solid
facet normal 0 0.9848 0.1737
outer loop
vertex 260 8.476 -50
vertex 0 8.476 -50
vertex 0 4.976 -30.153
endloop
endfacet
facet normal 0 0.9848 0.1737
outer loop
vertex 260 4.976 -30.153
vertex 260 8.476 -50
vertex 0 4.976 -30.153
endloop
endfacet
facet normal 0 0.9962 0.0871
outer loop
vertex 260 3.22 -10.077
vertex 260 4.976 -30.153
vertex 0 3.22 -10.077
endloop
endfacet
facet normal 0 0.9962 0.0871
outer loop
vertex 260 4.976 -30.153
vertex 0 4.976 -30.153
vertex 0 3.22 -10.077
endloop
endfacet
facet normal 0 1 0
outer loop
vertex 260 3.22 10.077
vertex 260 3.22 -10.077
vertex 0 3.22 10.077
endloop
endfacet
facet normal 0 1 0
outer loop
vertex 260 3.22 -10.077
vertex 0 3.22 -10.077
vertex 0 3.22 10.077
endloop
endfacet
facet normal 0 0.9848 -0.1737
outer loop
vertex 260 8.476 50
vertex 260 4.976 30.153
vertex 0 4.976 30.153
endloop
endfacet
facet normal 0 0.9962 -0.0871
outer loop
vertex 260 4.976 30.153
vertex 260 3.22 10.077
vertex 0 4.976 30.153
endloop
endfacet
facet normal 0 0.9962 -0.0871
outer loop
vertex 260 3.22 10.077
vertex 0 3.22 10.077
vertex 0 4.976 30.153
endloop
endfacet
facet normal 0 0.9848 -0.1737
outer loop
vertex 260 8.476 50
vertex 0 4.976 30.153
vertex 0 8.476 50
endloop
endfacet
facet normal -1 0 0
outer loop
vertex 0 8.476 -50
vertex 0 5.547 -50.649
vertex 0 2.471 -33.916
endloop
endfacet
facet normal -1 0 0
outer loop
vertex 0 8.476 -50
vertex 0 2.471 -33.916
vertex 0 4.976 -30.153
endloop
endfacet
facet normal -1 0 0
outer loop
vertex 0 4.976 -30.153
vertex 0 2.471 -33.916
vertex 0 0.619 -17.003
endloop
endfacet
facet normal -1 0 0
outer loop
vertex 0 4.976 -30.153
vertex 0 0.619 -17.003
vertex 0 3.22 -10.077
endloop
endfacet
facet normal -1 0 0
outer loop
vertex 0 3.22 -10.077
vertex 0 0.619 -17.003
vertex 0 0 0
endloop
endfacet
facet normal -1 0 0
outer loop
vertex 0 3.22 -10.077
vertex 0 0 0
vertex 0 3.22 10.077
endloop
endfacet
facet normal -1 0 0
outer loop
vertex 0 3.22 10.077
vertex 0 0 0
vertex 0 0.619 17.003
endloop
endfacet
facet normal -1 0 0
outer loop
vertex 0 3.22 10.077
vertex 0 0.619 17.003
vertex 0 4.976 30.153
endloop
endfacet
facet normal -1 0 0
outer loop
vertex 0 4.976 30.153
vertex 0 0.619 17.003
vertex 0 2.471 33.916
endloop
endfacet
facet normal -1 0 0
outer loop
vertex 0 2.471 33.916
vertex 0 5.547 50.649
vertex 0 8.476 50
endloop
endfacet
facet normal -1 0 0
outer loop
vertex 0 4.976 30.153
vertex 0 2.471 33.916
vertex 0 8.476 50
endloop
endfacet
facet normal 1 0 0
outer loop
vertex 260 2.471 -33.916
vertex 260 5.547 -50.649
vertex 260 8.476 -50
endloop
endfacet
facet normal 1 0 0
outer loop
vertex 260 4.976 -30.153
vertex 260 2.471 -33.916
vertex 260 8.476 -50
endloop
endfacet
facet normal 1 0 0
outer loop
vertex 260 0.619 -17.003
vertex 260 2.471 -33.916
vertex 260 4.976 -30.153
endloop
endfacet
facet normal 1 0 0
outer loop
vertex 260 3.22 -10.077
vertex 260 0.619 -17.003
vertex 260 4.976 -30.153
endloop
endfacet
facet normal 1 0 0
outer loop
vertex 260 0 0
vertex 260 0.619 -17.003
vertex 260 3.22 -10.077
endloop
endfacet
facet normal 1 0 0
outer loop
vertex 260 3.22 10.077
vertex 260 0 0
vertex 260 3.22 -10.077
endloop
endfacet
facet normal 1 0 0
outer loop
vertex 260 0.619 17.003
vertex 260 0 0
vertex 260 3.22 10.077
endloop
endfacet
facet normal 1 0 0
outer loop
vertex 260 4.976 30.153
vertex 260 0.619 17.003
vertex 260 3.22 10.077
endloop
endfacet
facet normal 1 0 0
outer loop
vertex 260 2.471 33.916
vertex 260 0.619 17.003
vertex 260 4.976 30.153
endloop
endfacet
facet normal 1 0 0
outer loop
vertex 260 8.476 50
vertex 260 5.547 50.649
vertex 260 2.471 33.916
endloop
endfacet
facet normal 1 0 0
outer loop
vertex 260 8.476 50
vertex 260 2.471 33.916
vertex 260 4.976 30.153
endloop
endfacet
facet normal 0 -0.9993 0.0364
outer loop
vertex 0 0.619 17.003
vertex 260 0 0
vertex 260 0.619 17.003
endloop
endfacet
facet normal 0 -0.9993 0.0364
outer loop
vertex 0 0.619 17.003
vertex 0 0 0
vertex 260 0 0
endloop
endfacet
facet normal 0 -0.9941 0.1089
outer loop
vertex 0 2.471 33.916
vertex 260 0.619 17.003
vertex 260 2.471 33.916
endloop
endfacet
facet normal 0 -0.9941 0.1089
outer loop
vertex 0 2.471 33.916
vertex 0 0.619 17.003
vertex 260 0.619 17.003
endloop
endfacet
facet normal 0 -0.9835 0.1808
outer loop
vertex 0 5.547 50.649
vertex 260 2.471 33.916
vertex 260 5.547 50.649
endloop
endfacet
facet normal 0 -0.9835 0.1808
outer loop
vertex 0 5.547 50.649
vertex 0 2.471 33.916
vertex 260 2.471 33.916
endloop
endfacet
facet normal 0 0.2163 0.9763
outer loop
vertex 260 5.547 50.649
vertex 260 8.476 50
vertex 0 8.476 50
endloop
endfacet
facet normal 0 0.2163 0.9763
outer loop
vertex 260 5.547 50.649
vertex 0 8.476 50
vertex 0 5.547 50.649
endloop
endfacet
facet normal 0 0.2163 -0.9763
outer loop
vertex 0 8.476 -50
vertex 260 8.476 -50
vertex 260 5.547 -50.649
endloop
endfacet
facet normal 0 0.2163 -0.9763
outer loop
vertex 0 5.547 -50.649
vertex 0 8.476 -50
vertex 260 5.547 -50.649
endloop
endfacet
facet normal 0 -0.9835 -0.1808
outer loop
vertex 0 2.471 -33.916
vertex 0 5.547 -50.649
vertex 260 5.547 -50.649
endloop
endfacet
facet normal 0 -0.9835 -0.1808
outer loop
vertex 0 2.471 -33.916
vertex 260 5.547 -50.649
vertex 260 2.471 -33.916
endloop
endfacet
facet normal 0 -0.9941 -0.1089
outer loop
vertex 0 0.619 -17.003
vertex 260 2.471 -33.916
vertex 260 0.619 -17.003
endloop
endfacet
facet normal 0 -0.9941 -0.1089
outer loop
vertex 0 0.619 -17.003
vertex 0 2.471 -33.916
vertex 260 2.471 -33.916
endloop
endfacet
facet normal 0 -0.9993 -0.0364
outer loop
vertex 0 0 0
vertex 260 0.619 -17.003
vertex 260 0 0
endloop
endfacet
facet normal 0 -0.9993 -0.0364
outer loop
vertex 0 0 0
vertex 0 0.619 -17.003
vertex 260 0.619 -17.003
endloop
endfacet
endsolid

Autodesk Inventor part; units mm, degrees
ref_plane "YZ Plane" through (0, 0, 0) normal (1, 0, 0) x (0, 1, 0)
ref_plane "XZ Plane" through (0, 0, 0) normal (0, 1, 0) x (-1, 0, 0)
ref_plane "XY Plane" through (0, 0, 0) normal (0, 0, 1) x (1, 0, 0)
sketch "スケッチ1" plane through (0, 0, 0) normal (1, 0, 0) x (0, 1, 0)
  arc A0 (8.4759, 50) -> (8.4759, -50) centre (234.0113, 0) ccw
  arc A1 (5.547, 50.6493) -> (5.547, -50.6493) centre (234.0113, 0) ccw
  line L0 (8.4759, 50) -> (5.547, 50.6493)
  line L1 (8.4759, -50) -> (5.547, -50.6493)
  line L2 (0, -70.909) -> (0, 70.909) projected
  point P0 (0, 0)
  point P1 (0, 0)
  dimension "d0" = 3
  dimension "d1" = 100
  dimension "d2" = 25
extrude "押し出し1" add sketch "スケッチ1" along normal blind 260
properties part number "element_4" material "CFRP"
